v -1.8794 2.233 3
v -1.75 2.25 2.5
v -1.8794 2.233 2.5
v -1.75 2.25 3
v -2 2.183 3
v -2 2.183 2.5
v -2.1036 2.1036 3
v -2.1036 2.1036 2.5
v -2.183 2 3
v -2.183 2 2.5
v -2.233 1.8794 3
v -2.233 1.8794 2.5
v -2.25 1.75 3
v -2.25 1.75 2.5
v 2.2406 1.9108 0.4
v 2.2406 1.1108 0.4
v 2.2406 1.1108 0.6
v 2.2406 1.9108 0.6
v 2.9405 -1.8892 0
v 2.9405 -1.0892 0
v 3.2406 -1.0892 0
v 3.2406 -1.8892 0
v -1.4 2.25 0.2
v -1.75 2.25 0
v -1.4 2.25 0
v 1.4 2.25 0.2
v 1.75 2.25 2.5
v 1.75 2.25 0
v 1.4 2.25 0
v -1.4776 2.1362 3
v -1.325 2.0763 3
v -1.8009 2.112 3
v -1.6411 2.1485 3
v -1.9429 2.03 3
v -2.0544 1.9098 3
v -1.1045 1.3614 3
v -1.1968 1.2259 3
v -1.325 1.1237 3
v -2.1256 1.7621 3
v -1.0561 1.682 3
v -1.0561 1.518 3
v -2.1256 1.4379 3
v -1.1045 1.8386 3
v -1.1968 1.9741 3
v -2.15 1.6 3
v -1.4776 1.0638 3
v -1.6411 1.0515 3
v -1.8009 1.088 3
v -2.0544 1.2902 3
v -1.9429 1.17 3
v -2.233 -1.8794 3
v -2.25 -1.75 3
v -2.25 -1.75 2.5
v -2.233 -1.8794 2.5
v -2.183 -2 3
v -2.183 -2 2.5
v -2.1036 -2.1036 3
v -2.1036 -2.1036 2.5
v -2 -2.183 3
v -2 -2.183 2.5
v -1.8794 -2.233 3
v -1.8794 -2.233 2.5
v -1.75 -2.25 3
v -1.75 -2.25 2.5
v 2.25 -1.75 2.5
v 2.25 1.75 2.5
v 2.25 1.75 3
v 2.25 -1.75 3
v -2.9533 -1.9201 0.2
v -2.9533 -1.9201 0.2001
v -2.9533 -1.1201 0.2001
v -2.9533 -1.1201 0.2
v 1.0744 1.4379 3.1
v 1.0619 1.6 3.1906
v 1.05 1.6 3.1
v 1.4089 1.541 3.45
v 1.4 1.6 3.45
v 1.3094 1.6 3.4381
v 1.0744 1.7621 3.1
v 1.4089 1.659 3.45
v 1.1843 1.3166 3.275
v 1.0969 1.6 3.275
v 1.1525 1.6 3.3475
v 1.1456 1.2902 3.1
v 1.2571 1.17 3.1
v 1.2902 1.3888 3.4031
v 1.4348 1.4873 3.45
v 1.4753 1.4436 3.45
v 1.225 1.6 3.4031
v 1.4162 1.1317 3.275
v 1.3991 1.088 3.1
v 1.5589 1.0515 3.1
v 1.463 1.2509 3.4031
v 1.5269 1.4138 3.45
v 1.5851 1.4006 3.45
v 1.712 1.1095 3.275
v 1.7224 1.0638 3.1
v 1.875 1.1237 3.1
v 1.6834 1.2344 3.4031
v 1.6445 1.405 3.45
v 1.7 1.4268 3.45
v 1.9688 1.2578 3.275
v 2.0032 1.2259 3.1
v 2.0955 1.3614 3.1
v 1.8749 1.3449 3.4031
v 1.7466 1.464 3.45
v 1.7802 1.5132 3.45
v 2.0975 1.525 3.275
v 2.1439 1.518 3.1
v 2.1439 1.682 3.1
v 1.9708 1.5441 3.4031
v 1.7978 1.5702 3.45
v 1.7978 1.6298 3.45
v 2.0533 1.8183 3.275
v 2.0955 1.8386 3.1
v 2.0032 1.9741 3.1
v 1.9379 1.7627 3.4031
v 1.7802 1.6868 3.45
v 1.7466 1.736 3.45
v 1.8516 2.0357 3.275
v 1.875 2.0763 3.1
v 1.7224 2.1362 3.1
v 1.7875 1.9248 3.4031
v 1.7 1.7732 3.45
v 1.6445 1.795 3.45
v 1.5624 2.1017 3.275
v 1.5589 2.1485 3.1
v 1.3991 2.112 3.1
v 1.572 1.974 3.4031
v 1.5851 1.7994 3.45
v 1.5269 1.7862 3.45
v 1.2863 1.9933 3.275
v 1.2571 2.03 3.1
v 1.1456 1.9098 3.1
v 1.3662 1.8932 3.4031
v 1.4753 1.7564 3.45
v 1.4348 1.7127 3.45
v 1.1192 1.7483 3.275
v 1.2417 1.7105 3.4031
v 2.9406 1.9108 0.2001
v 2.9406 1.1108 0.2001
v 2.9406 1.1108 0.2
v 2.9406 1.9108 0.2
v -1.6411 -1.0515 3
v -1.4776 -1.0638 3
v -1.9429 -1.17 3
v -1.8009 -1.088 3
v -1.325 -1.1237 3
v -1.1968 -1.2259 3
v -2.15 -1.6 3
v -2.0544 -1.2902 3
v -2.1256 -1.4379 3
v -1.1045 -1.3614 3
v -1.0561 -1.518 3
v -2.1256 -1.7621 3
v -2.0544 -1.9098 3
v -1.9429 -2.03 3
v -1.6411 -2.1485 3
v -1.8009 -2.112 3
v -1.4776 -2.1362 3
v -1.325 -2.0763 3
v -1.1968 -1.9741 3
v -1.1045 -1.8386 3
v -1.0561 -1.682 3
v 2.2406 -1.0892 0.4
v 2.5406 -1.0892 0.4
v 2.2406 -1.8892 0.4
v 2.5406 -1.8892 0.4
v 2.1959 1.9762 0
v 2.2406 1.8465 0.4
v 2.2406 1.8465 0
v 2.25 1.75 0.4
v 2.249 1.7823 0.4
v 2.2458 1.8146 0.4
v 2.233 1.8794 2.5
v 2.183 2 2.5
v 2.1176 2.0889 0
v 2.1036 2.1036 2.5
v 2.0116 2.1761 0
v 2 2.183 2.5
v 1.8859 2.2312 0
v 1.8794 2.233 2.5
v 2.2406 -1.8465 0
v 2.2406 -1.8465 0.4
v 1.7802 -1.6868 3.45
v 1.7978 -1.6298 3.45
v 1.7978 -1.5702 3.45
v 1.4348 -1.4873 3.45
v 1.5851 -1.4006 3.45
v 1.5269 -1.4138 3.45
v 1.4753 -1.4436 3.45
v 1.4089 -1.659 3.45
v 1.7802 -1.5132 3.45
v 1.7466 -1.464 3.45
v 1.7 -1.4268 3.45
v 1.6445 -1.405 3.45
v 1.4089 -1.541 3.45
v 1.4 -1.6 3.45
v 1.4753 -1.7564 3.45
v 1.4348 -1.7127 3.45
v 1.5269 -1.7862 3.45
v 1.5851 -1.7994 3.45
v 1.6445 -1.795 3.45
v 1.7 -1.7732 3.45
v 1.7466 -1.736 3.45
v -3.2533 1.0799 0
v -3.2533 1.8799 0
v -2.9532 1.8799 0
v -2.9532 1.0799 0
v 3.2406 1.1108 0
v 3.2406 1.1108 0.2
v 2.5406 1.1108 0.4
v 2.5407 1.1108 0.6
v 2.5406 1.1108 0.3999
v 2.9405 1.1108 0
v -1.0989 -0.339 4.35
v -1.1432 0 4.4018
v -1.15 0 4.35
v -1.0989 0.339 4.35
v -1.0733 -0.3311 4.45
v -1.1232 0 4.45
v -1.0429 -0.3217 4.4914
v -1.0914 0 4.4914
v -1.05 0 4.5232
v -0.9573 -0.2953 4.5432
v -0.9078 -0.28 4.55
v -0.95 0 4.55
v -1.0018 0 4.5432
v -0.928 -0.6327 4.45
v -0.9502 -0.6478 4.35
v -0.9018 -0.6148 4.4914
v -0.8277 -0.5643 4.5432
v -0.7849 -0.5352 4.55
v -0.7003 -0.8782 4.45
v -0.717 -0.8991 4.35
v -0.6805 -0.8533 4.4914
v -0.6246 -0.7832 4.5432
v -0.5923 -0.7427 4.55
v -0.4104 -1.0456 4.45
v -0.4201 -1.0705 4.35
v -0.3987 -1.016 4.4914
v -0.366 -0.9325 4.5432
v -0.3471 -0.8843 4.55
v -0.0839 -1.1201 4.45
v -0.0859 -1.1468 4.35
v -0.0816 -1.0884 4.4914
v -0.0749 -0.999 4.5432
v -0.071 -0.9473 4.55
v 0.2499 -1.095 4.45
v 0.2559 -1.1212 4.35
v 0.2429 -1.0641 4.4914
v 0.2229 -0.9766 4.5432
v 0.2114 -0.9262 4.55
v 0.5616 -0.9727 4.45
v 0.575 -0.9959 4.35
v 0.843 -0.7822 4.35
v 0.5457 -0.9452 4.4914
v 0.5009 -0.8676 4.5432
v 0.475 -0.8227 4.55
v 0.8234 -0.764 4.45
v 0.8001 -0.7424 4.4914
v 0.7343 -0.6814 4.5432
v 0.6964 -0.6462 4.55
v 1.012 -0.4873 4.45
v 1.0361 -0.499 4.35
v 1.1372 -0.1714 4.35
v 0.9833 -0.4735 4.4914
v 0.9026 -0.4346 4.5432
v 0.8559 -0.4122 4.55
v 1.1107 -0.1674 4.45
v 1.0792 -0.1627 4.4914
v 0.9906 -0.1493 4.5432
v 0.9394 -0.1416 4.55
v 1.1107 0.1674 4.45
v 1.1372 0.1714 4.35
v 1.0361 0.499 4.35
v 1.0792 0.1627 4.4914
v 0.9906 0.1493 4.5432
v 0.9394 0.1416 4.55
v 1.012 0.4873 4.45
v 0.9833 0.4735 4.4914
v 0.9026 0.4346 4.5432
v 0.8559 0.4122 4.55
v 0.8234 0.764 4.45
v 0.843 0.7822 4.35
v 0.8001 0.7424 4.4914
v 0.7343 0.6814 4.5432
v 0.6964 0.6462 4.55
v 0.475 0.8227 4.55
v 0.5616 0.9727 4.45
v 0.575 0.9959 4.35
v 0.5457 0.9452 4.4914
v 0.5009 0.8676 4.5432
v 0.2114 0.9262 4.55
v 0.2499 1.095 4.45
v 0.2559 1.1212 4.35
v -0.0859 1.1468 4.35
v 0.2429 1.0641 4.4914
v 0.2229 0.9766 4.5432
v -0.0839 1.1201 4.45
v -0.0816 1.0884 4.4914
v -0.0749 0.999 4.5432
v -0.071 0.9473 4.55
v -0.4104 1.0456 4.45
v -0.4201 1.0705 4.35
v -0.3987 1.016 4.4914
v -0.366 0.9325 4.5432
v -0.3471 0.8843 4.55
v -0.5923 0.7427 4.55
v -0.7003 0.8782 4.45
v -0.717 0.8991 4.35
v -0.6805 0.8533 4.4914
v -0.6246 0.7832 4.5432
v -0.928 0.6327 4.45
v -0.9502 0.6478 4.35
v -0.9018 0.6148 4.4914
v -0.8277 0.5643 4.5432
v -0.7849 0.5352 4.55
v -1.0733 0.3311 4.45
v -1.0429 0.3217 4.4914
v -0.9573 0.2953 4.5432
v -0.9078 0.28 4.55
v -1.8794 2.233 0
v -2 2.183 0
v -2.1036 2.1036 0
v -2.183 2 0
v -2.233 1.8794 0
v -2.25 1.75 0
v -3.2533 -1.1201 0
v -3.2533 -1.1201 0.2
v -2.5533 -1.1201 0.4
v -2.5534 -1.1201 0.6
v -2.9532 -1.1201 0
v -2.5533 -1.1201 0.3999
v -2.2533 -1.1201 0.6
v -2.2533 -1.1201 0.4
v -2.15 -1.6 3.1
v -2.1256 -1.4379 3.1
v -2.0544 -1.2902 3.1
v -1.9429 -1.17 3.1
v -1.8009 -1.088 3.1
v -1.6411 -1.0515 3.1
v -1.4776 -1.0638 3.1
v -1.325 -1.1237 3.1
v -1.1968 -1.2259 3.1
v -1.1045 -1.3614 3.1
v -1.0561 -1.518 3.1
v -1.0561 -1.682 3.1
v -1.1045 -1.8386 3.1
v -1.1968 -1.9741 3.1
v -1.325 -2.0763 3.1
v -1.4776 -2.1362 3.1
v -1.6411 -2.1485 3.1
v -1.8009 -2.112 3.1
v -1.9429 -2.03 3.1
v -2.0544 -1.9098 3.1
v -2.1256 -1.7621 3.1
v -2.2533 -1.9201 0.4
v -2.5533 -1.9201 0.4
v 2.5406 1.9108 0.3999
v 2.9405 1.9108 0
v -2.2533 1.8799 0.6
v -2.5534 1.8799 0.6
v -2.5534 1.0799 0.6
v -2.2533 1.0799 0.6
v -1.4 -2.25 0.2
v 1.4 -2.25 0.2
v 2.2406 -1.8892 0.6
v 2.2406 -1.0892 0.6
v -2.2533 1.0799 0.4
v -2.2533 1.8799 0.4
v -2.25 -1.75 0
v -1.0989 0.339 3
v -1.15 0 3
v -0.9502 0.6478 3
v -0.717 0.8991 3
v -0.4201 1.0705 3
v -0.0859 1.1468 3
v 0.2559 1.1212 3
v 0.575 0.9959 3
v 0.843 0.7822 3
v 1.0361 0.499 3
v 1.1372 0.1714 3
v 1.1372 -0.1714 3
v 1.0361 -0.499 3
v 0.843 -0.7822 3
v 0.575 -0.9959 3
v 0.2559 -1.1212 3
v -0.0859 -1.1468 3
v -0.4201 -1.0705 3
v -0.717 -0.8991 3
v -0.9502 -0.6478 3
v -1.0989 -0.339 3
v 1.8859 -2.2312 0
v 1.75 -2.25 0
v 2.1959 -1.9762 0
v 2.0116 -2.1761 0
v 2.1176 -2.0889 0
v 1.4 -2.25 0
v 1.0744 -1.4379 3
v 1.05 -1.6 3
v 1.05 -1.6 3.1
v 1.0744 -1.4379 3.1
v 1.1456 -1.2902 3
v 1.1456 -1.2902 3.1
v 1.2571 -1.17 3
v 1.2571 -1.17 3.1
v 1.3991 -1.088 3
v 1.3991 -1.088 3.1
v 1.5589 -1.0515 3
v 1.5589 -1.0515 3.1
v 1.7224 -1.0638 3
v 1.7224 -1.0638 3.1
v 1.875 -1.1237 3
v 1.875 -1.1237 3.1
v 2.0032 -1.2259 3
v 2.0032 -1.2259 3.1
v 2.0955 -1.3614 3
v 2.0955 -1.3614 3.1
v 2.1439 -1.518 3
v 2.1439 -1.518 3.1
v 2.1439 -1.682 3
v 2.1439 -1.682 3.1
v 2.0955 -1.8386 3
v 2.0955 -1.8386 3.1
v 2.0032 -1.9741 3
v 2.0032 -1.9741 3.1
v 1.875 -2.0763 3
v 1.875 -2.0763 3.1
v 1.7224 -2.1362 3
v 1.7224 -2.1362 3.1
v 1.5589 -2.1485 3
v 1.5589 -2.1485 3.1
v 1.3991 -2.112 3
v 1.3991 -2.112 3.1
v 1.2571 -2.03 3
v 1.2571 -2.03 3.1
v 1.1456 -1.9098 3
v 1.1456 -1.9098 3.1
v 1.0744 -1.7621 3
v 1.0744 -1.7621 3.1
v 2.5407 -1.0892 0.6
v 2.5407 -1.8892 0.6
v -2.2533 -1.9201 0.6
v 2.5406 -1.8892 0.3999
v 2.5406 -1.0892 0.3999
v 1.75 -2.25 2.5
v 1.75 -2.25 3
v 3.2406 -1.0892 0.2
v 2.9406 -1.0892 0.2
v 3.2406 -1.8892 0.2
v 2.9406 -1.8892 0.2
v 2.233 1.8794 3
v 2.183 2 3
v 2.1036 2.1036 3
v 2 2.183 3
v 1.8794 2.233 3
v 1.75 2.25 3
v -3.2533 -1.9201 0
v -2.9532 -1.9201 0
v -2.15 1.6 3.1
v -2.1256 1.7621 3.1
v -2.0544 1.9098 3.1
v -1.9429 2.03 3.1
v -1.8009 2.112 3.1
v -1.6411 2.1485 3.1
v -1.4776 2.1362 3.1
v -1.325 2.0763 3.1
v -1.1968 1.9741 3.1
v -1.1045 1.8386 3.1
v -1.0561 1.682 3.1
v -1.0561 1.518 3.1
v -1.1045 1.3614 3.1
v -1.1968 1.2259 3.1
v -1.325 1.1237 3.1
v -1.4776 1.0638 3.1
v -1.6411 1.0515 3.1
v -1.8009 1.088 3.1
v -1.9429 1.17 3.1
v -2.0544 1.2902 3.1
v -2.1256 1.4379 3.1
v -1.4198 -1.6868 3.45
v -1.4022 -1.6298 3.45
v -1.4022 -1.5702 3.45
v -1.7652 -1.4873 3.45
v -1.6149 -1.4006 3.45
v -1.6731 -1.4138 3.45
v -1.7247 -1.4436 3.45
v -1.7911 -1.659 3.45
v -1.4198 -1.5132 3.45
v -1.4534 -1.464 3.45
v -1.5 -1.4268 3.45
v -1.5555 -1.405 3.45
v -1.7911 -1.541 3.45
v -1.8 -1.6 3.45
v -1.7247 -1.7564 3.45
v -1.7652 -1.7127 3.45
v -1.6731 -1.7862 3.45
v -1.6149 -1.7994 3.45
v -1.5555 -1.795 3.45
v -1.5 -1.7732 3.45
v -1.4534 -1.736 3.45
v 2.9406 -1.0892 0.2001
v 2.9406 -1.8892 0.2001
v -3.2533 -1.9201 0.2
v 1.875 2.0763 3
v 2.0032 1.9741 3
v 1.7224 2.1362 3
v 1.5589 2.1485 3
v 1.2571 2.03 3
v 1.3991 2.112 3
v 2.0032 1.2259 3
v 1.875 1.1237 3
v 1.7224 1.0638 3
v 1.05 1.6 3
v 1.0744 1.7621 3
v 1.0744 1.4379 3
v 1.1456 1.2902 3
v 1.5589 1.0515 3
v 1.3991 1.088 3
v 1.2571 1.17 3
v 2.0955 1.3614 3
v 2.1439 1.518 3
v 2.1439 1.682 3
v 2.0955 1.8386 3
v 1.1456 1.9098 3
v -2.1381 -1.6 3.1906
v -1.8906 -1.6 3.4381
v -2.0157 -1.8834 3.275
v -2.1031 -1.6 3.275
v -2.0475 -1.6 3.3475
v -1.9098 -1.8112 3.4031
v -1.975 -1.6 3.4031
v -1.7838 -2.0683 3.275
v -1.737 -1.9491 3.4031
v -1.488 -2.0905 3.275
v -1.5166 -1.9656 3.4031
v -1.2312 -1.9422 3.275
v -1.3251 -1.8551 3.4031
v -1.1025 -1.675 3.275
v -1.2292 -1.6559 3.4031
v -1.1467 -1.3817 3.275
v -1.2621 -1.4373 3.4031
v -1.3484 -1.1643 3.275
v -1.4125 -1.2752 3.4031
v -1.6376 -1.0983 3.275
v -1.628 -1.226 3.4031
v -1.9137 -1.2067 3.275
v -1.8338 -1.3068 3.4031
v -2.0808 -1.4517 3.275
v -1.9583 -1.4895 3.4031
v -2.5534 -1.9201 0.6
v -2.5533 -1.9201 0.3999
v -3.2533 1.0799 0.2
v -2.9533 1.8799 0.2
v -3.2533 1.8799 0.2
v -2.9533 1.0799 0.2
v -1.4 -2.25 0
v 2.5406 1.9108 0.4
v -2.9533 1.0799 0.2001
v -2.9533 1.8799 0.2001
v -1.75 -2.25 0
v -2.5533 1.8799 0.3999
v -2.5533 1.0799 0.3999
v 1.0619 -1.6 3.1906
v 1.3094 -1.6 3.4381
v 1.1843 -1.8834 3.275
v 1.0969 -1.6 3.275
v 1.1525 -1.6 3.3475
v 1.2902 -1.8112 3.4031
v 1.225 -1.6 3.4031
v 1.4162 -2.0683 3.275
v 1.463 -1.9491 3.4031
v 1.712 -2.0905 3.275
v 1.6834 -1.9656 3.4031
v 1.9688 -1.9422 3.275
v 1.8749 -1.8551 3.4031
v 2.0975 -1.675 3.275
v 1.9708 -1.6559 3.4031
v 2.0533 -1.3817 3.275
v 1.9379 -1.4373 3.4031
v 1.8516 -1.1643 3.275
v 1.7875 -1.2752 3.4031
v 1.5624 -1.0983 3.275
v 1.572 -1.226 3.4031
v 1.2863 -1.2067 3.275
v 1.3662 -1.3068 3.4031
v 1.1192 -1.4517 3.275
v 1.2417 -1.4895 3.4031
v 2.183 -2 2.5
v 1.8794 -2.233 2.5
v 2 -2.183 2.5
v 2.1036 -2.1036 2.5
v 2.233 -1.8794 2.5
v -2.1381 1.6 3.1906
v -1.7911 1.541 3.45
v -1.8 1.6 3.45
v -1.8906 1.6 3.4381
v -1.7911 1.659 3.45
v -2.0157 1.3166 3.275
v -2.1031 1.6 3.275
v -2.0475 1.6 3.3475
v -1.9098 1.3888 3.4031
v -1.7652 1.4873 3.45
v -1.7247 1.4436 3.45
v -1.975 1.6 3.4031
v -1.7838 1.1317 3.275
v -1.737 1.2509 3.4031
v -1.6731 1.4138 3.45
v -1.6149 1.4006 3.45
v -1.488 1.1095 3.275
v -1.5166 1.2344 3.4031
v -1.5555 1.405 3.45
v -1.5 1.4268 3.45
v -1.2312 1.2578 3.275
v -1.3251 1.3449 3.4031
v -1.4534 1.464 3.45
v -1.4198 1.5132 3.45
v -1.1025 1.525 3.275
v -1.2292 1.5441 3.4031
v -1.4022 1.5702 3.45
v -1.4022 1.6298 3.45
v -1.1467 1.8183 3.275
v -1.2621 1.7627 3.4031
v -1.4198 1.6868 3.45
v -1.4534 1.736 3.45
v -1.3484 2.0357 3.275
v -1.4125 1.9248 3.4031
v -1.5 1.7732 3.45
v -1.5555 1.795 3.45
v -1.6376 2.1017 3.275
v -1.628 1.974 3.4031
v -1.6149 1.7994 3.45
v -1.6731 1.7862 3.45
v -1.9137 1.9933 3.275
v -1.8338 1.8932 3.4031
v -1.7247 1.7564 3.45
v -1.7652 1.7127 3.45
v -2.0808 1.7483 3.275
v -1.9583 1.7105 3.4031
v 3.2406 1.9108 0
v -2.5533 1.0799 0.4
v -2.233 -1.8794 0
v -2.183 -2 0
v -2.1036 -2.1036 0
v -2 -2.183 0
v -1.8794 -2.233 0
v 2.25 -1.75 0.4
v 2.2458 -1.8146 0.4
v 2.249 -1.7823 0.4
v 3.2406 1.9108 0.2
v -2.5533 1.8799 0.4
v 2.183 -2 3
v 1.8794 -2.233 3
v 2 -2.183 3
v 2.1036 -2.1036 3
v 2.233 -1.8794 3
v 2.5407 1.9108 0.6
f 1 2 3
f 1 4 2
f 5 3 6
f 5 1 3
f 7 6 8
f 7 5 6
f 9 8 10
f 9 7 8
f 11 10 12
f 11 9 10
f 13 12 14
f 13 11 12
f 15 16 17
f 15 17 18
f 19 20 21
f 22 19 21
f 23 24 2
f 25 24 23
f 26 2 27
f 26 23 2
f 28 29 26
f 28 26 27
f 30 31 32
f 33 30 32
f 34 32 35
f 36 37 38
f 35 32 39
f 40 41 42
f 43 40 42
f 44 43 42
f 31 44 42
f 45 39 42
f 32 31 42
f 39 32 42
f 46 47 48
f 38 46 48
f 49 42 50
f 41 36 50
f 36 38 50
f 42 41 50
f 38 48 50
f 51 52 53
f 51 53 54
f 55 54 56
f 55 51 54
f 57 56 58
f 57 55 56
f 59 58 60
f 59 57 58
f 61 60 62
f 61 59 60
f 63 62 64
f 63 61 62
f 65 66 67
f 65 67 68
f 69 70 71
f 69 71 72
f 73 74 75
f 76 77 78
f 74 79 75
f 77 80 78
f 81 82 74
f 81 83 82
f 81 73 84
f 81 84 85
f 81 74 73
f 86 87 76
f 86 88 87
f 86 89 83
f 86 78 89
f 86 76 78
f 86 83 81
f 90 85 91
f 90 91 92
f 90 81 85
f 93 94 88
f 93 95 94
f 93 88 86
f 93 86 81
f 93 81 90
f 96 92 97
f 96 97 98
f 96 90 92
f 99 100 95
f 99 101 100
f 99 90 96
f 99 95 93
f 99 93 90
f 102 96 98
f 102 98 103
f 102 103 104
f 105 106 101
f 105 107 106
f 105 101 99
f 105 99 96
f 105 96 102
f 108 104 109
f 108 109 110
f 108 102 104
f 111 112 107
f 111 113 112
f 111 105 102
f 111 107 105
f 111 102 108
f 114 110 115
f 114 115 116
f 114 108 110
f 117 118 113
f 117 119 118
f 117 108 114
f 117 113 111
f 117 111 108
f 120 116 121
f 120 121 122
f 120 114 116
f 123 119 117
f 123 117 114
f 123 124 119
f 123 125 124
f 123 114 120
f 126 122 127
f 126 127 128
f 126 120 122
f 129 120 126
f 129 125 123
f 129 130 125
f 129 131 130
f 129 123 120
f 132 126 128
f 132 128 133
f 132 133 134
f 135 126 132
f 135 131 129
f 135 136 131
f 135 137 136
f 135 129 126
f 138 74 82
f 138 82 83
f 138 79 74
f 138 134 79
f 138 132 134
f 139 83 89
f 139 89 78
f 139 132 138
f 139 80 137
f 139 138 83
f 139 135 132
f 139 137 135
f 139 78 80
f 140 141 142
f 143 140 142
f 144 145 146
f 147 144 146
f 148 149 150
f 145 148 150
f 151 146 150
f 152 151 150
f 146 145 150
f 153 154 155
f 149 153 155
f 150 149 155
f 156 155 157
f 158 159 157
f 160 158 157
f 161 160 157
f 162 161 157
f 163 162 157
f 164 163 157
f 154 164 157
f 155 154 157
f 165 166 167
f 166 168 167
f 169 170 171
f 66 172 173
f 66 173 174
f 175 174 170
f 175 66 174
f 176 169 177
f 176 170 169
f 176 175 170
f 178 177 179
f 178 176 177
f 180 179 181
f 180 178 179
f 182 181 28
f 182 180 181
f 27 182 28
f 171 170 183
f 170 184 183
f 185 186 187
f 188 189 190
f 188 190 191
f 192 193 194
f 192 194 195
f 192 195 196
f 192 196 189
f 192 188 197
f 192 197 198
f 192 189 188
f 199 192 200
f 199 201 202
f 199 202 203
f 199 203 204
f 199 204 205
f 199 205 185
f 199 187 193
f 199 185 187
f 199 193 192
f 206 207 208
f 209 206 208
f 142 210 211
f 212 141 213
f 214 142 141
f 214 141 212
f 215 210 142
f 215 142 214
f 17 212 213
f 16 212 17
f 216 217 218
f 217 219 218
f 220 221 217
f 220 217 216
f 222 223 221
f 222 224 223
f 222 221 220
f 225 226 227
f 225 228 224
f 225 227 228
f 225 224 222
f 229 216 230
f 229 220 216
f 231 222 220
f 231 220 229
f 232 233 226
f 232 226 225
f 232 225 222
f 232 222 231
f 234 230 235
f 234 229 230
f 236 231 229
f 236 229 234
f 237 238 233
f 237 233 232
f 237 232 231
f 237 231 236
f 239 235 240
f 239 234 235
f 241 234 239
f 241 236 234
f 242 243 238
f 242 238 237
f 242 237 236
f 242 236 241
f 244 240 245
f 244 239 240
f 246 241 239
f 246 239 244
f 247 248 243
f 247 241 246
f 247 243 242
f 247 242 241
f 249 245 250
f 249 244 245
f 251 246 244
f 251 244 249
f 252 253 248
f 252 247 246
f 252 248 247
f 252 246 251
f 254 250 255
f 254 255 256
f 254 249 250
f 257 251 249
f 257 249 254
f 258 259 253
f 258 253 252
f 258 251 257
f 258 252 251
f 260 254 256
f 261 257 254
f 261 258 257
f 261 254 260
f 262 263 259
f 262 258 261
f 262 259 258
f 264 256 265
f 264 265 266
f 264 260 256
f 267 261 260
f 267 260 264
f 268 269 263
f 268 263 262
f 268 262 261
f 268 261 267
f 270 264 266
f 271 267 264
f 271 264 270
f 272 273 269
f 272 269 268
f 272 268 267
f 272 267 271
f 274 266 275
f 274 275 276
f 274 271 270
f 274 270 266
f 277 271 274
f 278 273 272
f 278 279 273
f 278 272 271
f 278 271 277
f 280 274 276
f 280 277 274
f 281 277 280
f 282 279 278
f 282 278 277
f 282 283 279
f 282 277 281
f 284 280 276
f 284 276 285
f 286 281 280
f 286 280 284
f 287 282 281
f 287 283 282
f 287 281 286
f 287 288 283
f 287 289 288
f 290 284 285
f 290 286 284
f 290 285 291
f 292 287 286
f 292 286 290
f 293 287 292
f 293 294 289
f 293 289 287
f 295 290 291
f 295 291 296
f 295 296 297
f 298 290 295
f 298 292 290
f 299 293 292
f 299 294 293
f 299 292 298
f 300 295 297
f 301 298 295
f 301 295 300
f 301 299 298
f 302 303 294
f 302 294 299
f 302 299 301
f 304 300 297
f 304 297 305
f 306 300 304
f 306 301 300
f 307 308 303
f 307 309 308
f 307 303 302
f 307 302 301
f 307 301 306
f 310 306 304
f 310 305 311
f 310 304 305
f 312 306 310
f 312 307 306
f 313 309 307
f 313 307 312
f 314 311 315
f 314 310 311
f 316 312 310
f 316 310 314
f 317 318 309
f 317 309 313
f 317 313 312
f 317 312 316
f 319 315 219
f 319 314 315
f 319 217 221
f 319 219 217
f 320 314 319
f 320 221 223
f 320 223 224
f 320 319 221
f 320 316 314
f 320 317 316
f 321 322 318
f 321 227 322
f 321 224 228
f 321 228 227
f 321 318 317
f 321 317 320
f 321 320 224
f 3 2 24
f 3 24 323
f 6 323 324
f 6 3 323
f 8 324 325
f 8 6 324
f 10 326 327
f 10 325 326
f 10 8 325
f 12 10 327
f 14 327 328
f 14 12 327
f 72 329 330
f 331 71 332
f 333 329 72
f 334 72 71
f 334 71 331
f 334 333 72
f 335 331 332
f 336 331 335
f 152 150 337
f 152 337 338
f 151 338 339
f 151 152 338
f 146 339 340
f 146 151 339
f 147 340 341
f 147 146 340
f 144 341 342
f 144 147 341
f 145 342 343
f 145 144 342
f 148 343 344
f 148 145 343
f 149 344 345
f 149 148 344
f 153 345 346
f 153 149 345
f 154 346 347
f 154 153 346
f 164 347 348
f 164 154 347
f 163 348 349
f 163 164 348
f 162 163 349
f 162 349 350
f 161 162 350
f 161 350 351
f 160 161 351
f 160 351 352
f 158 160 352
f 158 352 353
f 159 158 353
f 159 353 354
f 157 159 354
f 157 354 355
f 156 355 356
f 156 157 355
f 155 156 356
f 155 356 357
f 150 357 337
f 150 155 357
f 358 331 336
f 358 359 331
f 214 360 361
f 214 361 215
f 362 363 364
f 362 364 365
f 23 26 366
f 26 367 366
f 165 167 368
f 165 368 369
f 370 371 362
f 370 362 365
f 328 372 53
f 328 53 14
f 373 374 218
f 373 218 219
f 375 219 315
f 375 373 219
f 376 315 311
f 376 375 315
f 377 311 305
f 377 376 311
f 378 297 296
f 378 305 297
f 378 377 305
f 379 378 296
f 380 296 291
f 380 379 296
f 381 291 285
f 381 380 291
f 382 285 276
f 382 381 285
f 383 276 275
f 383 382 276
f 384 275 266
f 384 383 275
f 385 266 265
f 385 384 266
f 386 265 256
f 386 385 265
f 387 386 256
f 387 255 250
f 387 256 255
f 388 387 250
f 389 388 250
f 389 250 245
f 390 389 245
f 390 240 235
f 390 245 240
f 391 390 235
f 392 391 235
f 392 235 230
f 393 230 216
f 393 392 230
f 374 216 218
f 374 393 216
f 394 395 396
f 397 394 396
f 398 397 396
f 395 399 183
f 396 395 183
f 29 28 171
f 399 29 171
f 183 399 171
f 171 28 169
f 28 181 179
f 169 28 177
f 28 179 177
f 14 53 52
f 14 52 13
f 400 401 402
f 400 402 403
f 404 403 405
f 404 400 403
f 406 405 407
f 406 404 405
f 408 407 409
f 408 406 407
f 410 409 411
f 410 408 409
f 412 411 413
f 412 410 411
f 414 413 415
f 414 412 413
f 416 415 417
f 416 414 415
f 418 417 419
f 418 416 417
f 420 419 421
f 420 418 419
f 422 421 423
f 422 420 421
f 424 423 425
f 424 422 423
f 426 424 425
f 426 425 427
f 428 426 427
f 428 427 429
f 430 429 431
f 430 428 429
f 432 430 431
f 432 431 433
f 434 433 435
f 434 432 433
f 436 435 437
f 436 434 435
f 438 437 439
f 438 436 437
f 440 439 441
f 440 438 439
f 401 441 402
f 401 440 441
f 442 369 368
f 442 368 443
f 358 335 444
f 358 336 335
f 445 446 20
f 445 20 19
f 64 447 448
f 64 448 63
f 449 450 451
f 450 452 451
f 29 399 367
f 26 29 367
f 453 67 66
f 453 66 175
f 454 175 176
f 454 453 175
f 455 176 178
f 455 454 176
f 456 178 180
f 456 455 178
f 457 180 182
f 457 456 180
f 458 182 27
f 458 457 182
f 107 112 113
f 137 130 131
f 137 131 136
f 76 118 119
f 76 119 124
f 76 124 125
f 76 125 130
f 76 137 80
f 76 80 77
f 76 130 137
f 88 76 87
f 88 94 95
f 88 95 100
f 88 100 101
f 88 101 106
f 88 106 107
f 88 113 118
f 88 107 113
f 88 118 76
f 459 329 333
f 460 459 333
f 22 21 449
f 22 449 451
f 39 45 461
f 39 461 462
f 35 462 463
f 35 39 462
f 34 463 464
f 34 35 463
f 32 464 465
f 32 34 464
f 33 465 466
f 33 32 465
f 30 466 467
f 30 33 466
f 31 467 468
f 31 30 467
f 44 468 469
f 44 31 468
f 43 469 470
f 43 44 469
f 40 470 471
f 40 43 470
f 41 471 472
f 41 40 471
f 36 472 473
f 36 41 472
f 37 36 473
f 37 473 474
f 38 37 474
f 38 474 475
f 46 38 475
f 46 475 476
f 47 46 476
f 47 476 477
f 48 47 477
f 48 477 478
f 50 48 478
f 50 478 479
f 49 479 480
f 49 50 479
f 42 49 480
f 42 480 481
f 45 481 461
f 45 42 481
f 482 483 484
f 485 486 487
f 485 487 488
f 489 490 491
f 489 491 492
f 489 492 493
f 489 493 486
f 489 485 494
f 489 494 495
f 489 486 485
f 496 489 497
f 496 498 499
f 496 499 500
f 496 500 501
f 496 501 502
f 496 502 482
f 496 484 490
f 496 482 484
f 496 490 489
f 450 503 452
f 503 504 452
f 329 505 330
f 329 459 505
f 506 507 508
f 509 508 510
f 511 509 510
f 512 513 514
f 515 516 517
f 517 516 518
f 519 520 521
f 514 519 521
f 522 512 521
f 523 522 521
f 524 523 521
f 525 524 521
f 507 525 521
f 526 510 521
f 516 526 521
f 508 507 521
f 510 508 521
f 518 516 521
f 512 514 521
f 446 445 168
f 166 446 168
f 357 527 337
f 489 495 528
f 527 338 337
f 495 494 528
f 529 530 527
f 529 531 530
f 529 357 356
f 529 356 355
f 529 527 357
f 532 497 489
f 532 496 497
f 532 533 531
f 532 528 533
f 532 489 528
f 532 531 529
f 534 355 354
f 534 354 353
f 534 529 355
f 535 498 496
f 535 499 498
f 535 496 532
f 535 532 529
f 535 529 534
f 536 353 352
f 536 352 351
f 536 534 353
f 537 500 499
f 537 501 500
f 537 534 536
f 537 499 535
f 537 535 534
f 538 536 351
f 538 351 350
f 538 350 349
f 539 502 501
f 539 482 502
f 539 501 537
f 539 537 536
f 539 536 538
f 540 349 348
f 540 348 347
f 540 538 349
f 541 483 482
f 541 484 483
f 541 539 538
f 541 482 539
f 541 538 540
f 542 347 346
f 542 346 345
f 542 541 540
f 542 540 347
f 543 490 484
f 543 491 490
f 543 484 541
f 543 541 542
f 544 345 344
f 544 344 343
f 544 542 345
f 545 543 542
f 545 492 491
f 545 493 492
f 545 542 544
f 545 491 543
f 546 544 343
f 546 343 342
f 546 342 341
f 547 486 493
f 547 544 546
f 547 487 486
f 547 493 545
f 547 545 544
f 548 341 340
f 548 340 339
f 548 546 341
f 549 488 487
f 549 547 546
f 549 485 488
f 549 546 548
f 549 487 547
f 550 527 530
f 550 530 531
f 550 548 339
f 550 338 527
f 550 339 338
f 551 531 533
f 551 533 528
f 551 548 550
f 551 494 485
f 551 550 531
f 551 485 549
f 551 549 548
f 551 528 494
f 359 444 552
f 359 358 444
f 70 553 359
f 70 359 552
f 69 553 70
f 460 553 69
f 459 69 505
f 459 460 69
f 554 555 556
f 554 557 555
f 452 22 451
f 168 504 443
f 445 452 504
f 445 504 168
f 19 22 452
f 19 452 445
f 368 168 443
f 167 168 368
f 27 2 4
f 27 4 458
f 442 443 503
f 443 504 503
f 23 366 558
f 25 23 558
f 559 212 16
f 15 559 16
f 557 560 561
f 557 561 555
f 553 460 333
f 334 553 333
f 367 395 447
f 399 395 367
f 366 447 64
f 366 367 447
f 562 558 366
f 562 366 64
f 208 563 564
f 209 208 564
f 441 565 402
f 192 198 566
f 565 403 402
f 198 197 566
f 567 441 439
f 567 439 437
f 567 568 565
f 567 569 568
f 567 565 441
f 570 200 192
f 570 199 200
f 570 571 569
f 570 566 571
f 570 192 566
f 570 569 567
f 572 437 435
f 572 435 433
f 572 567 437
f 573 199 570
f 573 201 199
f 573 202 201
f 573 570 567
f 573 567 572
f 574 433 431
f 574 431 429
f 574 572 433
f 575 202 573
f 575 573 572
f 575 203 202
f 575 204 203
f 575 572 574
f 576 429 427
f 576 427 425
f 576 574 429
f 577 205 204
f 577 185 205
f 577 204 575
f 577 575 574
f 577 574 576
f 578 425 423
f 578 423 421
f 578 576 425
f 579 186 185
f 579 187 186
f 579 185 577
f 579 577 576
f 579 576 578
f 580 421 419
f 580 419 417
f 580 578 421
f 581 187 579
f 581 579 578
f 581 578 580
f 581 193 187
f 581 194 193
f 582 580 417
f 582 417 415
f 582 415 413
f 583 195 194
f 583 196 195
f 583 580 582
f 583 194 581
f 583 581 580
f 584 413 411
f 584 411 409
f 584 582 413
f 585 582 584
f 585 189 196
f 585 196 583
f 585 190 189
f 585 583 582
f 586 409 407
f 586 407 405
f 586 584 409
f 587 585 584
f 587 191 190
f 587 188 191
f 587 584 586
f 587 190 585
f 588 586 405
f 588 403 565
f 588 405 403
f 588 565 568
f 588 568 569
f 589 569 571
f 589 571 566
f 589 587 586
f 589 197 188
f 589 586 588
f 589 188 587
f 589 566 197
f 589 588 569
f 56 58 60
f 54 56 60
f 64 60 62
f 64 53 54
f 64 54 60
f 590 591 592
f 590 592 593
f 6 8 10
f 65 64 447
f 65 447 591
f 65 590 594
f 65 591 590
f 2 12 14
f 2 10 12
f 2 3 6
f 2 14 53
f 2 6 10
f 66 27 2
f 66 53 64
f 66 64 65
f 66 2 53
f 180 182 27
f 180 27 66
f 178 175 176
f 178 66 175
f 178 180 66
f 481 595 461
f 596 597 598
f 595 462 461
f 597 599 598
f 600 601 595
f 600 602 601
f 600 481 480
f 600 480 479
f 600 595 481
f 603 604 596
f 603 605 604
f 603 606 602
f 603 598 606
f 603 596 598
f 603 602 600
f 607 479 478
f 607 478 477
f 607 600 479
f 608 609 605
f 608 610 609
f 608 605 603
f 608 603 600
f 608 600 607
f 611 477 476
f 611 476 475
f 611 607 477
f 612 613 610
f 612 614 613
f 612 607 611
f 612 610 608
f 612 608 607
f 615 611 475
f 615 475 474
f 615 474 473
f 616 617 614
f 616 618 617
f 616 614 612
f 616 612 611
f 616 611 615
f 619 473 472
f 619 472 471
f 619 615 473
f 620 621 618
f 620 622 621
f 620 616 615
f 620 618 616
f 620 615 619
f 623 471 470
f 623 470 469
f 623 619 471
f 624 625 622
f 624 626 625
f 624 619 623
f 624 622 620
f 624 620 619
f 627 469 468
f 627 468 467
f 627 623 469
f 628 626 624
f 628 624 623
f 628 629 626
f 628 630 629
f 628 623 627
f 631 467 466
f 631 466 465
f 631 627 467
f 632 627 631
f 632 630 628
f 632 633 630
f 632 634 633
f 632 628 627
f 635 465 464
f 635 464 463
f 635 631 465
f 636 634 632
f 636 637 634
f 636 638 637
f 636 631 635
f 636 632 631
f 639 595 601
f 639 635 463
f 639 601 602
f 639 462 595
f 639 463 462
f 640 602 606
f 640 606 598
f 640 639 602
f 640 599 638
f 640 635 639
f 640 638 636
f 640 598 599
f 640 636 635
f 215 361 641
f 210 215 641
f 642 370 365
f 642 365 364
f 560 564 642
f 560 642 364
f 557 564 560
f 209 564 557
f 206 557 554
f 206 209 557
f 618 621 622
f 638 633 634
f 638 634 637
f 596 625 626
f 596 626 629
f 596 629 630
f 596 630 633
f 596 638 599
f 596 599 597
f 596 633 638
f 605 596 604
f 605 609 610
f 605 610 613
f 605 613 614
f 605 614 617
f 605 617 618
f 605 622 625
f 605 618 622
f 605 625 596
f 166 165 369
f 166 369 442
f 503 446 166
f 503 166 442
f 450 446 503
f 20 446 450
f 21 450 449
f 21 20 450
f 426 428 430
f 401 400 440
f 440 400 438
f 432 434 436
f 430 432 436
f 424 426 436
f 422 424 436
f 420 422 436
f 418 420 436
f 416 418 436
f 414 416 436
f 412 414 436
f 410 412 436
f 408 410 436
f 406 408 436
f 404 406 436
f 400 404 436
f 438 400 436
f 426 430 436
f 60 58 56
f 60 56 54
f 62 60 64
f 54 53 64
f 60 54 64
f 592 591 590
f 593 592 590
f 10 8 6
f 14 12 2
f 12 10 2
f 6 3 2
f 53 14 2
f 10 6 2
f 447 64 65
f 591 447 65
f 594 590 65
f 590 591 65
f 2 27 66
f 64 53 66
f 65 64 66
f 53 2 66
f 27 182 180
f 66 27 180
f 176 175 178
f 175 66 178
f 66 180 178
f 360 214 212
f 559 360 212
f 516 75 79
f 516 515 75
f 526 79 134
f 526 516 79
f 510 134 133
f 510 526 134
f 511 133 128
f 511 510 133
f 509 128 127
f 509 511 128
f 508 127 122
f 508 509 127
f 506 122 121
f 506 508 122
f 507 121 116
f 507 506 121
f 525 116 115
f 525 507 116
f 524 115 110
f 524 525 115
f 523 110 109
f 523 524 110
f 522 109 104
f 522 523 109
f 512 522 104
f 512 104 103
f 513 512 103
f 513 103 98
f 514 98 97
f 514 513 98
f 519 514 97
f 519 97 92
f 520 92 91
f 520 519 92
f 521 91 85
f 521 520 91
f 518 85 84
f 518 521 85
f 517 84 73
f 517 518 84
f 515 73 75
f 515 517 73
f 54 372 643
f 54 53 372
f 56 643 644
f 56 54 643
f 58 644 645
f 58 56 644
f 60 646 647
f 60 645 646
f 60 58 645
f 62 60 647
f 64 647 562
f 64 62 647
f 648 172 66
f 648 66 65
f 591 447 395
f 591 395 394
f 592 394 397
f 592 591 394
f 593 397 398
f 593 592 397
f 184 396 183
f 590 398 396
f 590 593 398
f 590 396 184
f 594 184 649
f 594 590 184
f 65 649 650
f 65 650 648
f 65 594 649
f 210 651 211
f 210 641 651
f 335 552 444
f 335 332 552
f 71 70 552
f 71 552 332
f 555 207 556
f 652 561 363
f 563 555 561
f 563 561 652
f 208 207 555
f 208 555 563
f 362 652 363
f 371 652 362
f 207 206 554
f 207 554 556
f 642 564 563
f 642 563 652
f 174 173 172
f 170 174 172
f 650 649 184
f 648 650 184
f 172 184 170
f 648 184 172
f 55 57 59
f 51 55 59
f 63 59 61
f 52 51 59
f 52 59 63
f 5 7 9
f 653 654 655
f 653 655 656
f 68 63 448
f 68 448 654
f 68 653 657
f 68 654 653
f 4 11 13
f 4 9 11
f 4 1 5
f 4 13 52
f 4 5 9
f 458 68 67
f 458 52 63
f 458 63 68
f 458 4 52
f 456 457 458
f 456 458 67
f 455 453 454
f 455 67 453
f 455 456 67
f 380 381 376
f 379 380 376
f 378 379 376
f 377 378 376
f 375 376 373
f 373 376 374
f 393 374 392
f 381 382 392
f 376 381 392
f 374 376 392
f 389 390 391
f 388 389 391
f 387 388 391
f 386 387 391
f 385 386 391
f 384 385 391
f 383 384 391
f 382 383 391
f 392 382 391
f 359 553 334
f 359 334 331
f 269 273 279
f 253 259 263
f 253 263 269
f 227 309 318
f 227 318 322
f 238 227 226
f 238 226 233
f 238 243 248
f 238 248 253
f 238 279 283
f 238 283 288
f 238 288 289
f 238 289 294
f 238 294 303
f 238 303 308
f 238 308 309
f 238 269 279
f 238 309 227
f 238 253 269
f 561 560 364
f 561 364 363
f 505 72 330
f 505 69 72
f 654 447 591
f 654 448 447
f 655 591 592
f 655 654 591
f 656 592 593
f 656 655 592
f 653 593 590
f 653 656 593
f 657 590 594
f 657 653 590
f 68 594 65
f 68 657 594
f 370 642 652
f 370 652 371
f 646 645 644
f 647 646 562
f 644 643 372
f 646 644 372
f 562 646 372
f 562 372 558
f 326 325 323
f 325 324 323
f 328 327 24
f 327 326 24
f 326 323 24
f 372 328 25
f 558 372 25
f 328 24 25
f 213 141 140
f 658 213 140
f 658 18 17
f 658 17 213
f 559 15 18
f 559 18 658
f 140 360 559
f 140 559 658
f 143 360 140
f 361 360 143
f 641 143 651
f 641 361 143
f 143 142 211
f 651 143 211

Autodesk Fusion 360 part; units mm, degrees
sketch "Sketch1" plane through (0, 0, 0) normal (0, 0, 1) x (1, 0, 0)
  line L0 (2.25, -2.25) -> (-2.25, -2.25)
  line L1 (-2.25, -2.25) -> (-2.25, 2.25)
  line L2 (-2.25, 2.25) -> (2.25, 2.25)
  line L3 (2.25, 2.25) -> (2.25, -2.25)
  line L4 (2.25, -2.25) -> (-2.25, 2.25) construction
  line L5 (-2.25, -2.25) -> (2.25, 2.25) construction
  dimension "d1" = 4.5
  dimension "d2" = 4.5
extrude "Extrude1" add sketch "Sketch1" along normal blind 2.5 makes body 1
extrude "Extrude2" add 1 faces at (0.75, -0.75, 2.5) along direction (0, 0, 1) blind 0.5 separate body on bodies 1 makes body 2
sketch "Sketch2" plane through (0, 0, 3) normal (0, 0, 1) x (-1, 0, 0)
  line L0 (-2.25, -2.25) -> (2.25, -2.25)
  line L1 (2.25, -2.25) -> (2.25, 2.25)
  line L2 (2.25, 2.25) -> (-2.25, 2.25)
  line L3 (-2.25, 2.25) -> (-2.25, -2.25)
  circle A0 centre (0, 0) radius 1.15
  circle A1 centre (1.6, -1.6) radius 0.55
  circle A2 centre (-1.6, -1.6) radius 0.55
  circle A3 centre (1.6, 1.6) radius 0.55
  circle A4 centre (-1.6, 1.6) radius 0.55
  dimension "d7" = 2.3
  dimension "d8" = 1.1
  dimension "d9" = 0.65
  dimension "d10" = 0.65
  dimension "d13" = -3.2
  dimension "d14" = 3.2
extrude "Extrude3" add sketch "Sketch2" along normal blind 1.55 separate body contours A0 makes body 3
extrude "Extrude4" add sketch "Sketch2" along normal blind 0.45 separate body contours A1 | A2 | A3 | A4 makes body 4 at (-2.1473, 1.6548, 3.15) makes body 5 at (1.0527, 1.6548, 3.15) makes body 6 at (-2.1473, -1.5452, 3.15) makes body 7 at (1.0527, -1.5452, 3.15)
fillet "Fillet1" radius 0.5 8 edges at (2.25, -2.25, 1.25) (-2.25, -2.25, 1.25) (-2.25, 2.25, 1.25) (2.25, 2.25, 1.25) (2.25, -2.25, 2.75) (-2.25, -2.25, 2.75) (-2.25, 2.25, 2.75) (2.25, 2.25, 2.75) on bodies 1 2
fillet "Fillet2" radius 0.35 4 edges at (-1.0872, 1.7989, 3.45) (2.1128, 1.7989, 3.45) (-1.0872, -1.4011, 3.45) (2.1128, -1.4011, 3.45) on bodies 4 5 6 7
fillet "Fillet3" radius 0.2 1 edges at (1.0722, 0.4159, 4.55) on bodies 3
sketch "Sketch3" plane through (0, -2.25, 0) normal (0, -1, 0) x (1, 0, 0)
  line L0 (-1.75, 2.5) -> (-1.75, 0)
  line L1 (-1.75, 0) -> (1.75, 0)
  line L2 (1.75, 0) -> (1.75, 2.5)
  line L3 (1.75, 2.5) -> (-1.75, 2.5)
  line L4 (1.4, 0.2) -> (-1.4, 0.2)
  line L5 (-1.4, 0.2) -> (-1.4, 0)
  line L6 (1.4, 0) -> (1.4, 0.2)
extrude "Extrude5" cut sketch "Sketch3" against normal blind 4.5 contours L1 L4 L5 L6 bodies 1
sketch "Sketch4" plane through (0, 0, 0) normal (0, 0, 1) x (1, 0, 0)
  line L0 (-2.2533, 2.6048) -> (-2.2533, -2.6449) construction
  line L1 (3.1297, -2.259) -> (-2.9, -2.259) construction
  line L2 (-2.2533, -0.0201) -> (-2.2533, 1.4799) construction
  line L3 (-2.2533, -0.0201) -> (-2.2533, -1.5201) construction
  line L4 (2.2406, 0.0108) -> (2.2406, 1.5108) construction
  line L5 (2.2406, 0.0108) -> (2.2406, -1.4892) construction
  line L6 (-3.2533, 1.8799) -> (-2.2533, 1.8799)
  line L7 (-2.2533, 1.8799) -> (-2.2533, 1.0799)
  line L8 (-2.2533, 1.0799) -> (-3.2533, 1.0799)
  line L9 (-3.2533, 1.0799) -> (-3.2533, 1.8799)
  line L10 (-2.2533, 1.0799) -> (-3.2533, 1.8799) construction
  line L11 (-3.2533, 1.0799) -> (-2.2533, 1.8799) construction
  line L12 (-2.7533, 1.4799) -> (-3.2533, 1.4799) construction
  line L13 (-3.2533, 1.4799) -> (-2.7533, 1.4799) construction
  line L14 (-2.7533, 1.4799) -> (-2.2533, 1.4799) construction
  line L15 (3.2406, -1.0892) -> (3.2406, -1.8892)
  line L16 (2.2406, -1.8892) -> (3.2406, -1.0892) construction
  line L17 (2.2406, -1.4892) -> (2.7406, -1.4892) construction
  line L18 (2.7406, -1.4892) -> (2.2406, -1.4892) construction
  line L19 (2.7406, -1.4892) -> (3.2406, -1.4892) construction
  line L20 (3.2406, -1.8892) -> (2.2406, -1.8892)
  line L21 (3.2406, -1.8892) -> (2.2406, -1.0892) construction
  line L22 (2.2406, -1.8892) -> (2.2406, -1.0892)
  line L23 (2.2406, -1.0892) -> (3.2406, -1.0892)
  line L24 (2.2406, 1.5108) -> (2.7406, 1.5108) construction
  line L25 (3.2406, 1.9108) -> (3.2406, 1.1108)
  line L26 (2.7406, 1.5108) -> (3.2406, 1.5108) construction
  line L27 (2.2406, 1.1108) -> (3.2406, 1.9108) construction
  line L28 (3.2406, 1.1108) -> (2.2406, 1.9108) construction
  line L29 (3.2406, 1.1108) -> (2.2406, 1.1108)
  line L30 (2.2406, 1.1108) -> (2.2406, 1.9108)
  line L31 (2.2406, 1.9108) -> (3.2406, 1.9108)
  line L32 (2.7406, 1.5108) -> (2.2406, 1.5108) construction
  line L33 (-2.2533, -1.1201) -> (-2.2533, -1.9201)
  line L34 (-3.2533, -1.1201) -> (-2.2533, -1.1201)
  line L35 (-2.7533, -1.5201) -> (-2.2533, -1.5201) construction
  line L36 (-3.2533, -1.9201) -> (-2.2533, -1.1201) construction
  line L37 (-2.2533, -1.9201) -> (-3.2533, -1.1201) construction
  line L38 (-2.2533, -1.9201) -> (-3.2533, -1.9201)
  line L39 (-2.7533, -1.5201) -> (-3.2533, -1.5201) construction
  line L40 (-3.2533, -1.5201) -> (-2.7533, -1.5201) construction
  line L41 (-3.2533, -1.9201) -> (-3.2533, -1.1201)
  dimension "d27" = 1.5
  dimension "d28" = 1.5
  dimension "d29" = 1.5
  dimension "d30" = 1.5
  dimension "d31" = 1
  dimension "d32" = 0.8
  dimension "d33" = 1
  dimension "d34" = 0.8
  dimension "d35" = 1
  dimension "d36" = 0.8
  dimension "d37" = 1
  dimension "d38" = 0.8
extrude "Extrude6" add sketch "Sketch4" along normal blind 0.6 separate body makes body 8 at (-2.9199, -1.6534, 0) makes body 9 at (2.9073, -1.6226, 0) makes body 10 at (-2.9199, 1.3466, 0) makes body 11 at (2.574, 1.6441, 0)
sketch "Sketch5" plane through (0, -1.8892, 0) normal (0, -1, 0) x (1, 0, 0)
  line L0 (2.2406, 0) -> (3.2406, 0)
  line L1 (3.2406, 0) -> (3.2406, 0.6)
  line L2 (3.2406, 0.6) -> (2.2406, 0.6)
  line L3 (2.2406, 0.6) -> (2.2406, 0)
  line L4 (3.2406, 0.6) -> (2.9406, 0.6)
  line L5 (2.9406, 0.6) -> (2.9406, 0.2)
  line L6 (2.9406, 0.2) -> (3.2406, 0.2)
  line L7 (3.2406, 0.2) -> (3.2406, 0.6)
  line L8 (2.2406, 0) -> (2.5406, 0)
  line L9 (2.5406, 0) -> (2.5406, 0.4)
  line L10 (2.5406, 0.4) -> (2.2406, 0.4)
  line L11 (2.2406, 0.4) -> (2.2406, 0)
  dimension "d41" = 0.3
  dimension "d42" = 0.4
  dimension "d43" = 0.3
  dimension "d44" = 0.4
extrude "Extrude7" cut sketch "Sketch5" against normal blind 4.5 contours L0 L3 L8 L9 L10 L11 | L1 L2 L4 L5 L6 L7 bodies 1 9 11
sketch "Sketch6" plane through (0, -1.9201, 0) normal (0, -1, 0) x (1, 0, 0)
  line L0 (-3.2533, 0) -> (-2.2533, 0)
  line L1 (-2.2533, 0) -> (-2.2533, 0.6)
  line L2 (-2.2533, 0.6) -> (-3.2533, 0.6)
  line L3 (-3.2533, 0.6) -> (-3.2533, 0)
  line L4 (-3.2533, 0.6) -> (-2.9533, 0.6)
  line L5 (-2.9533, 0.6) -> (-2.9533, 0.2)
  line L6 (-2.9533, 0.2) -> (-3.2533, 0.2)
  line L7 (-3.2533, 0.2) -> (-3.2533, 0.6)
  line L8 (-2.2533, 0) -> (-2.5533, 0)
  line L9 (-2.5533, 0) -> (-2.5533, 0.4)
  line L10 (-2.5533, 0.4) -> (-2.2533, 0.4)
  line L11 (-2.2533, 0.4) -> (-2.2533, 0)
  dimension "d47" = 0.3
  dimension "d48" = 0.4
  dimension "d49" = 0.3
  dimension "d50" = 0.4
extrude "Extrude8" cut sketch "Sketch6" against normal blind 4.5 contours L0 L1 L8 L9 L10 L11 | L2 L3 L4 L5 L6 L7 bodies 8 10
chamfer "Chamfer1" distance 0.4 angle 45 8 edges at (-2.9533, 1.4799, 0.6) (-2.5533, 1.4799, 0) (-2.9533, -1.5201, 0.6) (-2.5533, -1.5201, 0) (2.9406, 1.5108, 0.6) (2.5406, 1.5108, 0) (2.9406, -1.4892, 0.6) (2.5406, -1.4892, 0) on bodies 8 9 10 11
